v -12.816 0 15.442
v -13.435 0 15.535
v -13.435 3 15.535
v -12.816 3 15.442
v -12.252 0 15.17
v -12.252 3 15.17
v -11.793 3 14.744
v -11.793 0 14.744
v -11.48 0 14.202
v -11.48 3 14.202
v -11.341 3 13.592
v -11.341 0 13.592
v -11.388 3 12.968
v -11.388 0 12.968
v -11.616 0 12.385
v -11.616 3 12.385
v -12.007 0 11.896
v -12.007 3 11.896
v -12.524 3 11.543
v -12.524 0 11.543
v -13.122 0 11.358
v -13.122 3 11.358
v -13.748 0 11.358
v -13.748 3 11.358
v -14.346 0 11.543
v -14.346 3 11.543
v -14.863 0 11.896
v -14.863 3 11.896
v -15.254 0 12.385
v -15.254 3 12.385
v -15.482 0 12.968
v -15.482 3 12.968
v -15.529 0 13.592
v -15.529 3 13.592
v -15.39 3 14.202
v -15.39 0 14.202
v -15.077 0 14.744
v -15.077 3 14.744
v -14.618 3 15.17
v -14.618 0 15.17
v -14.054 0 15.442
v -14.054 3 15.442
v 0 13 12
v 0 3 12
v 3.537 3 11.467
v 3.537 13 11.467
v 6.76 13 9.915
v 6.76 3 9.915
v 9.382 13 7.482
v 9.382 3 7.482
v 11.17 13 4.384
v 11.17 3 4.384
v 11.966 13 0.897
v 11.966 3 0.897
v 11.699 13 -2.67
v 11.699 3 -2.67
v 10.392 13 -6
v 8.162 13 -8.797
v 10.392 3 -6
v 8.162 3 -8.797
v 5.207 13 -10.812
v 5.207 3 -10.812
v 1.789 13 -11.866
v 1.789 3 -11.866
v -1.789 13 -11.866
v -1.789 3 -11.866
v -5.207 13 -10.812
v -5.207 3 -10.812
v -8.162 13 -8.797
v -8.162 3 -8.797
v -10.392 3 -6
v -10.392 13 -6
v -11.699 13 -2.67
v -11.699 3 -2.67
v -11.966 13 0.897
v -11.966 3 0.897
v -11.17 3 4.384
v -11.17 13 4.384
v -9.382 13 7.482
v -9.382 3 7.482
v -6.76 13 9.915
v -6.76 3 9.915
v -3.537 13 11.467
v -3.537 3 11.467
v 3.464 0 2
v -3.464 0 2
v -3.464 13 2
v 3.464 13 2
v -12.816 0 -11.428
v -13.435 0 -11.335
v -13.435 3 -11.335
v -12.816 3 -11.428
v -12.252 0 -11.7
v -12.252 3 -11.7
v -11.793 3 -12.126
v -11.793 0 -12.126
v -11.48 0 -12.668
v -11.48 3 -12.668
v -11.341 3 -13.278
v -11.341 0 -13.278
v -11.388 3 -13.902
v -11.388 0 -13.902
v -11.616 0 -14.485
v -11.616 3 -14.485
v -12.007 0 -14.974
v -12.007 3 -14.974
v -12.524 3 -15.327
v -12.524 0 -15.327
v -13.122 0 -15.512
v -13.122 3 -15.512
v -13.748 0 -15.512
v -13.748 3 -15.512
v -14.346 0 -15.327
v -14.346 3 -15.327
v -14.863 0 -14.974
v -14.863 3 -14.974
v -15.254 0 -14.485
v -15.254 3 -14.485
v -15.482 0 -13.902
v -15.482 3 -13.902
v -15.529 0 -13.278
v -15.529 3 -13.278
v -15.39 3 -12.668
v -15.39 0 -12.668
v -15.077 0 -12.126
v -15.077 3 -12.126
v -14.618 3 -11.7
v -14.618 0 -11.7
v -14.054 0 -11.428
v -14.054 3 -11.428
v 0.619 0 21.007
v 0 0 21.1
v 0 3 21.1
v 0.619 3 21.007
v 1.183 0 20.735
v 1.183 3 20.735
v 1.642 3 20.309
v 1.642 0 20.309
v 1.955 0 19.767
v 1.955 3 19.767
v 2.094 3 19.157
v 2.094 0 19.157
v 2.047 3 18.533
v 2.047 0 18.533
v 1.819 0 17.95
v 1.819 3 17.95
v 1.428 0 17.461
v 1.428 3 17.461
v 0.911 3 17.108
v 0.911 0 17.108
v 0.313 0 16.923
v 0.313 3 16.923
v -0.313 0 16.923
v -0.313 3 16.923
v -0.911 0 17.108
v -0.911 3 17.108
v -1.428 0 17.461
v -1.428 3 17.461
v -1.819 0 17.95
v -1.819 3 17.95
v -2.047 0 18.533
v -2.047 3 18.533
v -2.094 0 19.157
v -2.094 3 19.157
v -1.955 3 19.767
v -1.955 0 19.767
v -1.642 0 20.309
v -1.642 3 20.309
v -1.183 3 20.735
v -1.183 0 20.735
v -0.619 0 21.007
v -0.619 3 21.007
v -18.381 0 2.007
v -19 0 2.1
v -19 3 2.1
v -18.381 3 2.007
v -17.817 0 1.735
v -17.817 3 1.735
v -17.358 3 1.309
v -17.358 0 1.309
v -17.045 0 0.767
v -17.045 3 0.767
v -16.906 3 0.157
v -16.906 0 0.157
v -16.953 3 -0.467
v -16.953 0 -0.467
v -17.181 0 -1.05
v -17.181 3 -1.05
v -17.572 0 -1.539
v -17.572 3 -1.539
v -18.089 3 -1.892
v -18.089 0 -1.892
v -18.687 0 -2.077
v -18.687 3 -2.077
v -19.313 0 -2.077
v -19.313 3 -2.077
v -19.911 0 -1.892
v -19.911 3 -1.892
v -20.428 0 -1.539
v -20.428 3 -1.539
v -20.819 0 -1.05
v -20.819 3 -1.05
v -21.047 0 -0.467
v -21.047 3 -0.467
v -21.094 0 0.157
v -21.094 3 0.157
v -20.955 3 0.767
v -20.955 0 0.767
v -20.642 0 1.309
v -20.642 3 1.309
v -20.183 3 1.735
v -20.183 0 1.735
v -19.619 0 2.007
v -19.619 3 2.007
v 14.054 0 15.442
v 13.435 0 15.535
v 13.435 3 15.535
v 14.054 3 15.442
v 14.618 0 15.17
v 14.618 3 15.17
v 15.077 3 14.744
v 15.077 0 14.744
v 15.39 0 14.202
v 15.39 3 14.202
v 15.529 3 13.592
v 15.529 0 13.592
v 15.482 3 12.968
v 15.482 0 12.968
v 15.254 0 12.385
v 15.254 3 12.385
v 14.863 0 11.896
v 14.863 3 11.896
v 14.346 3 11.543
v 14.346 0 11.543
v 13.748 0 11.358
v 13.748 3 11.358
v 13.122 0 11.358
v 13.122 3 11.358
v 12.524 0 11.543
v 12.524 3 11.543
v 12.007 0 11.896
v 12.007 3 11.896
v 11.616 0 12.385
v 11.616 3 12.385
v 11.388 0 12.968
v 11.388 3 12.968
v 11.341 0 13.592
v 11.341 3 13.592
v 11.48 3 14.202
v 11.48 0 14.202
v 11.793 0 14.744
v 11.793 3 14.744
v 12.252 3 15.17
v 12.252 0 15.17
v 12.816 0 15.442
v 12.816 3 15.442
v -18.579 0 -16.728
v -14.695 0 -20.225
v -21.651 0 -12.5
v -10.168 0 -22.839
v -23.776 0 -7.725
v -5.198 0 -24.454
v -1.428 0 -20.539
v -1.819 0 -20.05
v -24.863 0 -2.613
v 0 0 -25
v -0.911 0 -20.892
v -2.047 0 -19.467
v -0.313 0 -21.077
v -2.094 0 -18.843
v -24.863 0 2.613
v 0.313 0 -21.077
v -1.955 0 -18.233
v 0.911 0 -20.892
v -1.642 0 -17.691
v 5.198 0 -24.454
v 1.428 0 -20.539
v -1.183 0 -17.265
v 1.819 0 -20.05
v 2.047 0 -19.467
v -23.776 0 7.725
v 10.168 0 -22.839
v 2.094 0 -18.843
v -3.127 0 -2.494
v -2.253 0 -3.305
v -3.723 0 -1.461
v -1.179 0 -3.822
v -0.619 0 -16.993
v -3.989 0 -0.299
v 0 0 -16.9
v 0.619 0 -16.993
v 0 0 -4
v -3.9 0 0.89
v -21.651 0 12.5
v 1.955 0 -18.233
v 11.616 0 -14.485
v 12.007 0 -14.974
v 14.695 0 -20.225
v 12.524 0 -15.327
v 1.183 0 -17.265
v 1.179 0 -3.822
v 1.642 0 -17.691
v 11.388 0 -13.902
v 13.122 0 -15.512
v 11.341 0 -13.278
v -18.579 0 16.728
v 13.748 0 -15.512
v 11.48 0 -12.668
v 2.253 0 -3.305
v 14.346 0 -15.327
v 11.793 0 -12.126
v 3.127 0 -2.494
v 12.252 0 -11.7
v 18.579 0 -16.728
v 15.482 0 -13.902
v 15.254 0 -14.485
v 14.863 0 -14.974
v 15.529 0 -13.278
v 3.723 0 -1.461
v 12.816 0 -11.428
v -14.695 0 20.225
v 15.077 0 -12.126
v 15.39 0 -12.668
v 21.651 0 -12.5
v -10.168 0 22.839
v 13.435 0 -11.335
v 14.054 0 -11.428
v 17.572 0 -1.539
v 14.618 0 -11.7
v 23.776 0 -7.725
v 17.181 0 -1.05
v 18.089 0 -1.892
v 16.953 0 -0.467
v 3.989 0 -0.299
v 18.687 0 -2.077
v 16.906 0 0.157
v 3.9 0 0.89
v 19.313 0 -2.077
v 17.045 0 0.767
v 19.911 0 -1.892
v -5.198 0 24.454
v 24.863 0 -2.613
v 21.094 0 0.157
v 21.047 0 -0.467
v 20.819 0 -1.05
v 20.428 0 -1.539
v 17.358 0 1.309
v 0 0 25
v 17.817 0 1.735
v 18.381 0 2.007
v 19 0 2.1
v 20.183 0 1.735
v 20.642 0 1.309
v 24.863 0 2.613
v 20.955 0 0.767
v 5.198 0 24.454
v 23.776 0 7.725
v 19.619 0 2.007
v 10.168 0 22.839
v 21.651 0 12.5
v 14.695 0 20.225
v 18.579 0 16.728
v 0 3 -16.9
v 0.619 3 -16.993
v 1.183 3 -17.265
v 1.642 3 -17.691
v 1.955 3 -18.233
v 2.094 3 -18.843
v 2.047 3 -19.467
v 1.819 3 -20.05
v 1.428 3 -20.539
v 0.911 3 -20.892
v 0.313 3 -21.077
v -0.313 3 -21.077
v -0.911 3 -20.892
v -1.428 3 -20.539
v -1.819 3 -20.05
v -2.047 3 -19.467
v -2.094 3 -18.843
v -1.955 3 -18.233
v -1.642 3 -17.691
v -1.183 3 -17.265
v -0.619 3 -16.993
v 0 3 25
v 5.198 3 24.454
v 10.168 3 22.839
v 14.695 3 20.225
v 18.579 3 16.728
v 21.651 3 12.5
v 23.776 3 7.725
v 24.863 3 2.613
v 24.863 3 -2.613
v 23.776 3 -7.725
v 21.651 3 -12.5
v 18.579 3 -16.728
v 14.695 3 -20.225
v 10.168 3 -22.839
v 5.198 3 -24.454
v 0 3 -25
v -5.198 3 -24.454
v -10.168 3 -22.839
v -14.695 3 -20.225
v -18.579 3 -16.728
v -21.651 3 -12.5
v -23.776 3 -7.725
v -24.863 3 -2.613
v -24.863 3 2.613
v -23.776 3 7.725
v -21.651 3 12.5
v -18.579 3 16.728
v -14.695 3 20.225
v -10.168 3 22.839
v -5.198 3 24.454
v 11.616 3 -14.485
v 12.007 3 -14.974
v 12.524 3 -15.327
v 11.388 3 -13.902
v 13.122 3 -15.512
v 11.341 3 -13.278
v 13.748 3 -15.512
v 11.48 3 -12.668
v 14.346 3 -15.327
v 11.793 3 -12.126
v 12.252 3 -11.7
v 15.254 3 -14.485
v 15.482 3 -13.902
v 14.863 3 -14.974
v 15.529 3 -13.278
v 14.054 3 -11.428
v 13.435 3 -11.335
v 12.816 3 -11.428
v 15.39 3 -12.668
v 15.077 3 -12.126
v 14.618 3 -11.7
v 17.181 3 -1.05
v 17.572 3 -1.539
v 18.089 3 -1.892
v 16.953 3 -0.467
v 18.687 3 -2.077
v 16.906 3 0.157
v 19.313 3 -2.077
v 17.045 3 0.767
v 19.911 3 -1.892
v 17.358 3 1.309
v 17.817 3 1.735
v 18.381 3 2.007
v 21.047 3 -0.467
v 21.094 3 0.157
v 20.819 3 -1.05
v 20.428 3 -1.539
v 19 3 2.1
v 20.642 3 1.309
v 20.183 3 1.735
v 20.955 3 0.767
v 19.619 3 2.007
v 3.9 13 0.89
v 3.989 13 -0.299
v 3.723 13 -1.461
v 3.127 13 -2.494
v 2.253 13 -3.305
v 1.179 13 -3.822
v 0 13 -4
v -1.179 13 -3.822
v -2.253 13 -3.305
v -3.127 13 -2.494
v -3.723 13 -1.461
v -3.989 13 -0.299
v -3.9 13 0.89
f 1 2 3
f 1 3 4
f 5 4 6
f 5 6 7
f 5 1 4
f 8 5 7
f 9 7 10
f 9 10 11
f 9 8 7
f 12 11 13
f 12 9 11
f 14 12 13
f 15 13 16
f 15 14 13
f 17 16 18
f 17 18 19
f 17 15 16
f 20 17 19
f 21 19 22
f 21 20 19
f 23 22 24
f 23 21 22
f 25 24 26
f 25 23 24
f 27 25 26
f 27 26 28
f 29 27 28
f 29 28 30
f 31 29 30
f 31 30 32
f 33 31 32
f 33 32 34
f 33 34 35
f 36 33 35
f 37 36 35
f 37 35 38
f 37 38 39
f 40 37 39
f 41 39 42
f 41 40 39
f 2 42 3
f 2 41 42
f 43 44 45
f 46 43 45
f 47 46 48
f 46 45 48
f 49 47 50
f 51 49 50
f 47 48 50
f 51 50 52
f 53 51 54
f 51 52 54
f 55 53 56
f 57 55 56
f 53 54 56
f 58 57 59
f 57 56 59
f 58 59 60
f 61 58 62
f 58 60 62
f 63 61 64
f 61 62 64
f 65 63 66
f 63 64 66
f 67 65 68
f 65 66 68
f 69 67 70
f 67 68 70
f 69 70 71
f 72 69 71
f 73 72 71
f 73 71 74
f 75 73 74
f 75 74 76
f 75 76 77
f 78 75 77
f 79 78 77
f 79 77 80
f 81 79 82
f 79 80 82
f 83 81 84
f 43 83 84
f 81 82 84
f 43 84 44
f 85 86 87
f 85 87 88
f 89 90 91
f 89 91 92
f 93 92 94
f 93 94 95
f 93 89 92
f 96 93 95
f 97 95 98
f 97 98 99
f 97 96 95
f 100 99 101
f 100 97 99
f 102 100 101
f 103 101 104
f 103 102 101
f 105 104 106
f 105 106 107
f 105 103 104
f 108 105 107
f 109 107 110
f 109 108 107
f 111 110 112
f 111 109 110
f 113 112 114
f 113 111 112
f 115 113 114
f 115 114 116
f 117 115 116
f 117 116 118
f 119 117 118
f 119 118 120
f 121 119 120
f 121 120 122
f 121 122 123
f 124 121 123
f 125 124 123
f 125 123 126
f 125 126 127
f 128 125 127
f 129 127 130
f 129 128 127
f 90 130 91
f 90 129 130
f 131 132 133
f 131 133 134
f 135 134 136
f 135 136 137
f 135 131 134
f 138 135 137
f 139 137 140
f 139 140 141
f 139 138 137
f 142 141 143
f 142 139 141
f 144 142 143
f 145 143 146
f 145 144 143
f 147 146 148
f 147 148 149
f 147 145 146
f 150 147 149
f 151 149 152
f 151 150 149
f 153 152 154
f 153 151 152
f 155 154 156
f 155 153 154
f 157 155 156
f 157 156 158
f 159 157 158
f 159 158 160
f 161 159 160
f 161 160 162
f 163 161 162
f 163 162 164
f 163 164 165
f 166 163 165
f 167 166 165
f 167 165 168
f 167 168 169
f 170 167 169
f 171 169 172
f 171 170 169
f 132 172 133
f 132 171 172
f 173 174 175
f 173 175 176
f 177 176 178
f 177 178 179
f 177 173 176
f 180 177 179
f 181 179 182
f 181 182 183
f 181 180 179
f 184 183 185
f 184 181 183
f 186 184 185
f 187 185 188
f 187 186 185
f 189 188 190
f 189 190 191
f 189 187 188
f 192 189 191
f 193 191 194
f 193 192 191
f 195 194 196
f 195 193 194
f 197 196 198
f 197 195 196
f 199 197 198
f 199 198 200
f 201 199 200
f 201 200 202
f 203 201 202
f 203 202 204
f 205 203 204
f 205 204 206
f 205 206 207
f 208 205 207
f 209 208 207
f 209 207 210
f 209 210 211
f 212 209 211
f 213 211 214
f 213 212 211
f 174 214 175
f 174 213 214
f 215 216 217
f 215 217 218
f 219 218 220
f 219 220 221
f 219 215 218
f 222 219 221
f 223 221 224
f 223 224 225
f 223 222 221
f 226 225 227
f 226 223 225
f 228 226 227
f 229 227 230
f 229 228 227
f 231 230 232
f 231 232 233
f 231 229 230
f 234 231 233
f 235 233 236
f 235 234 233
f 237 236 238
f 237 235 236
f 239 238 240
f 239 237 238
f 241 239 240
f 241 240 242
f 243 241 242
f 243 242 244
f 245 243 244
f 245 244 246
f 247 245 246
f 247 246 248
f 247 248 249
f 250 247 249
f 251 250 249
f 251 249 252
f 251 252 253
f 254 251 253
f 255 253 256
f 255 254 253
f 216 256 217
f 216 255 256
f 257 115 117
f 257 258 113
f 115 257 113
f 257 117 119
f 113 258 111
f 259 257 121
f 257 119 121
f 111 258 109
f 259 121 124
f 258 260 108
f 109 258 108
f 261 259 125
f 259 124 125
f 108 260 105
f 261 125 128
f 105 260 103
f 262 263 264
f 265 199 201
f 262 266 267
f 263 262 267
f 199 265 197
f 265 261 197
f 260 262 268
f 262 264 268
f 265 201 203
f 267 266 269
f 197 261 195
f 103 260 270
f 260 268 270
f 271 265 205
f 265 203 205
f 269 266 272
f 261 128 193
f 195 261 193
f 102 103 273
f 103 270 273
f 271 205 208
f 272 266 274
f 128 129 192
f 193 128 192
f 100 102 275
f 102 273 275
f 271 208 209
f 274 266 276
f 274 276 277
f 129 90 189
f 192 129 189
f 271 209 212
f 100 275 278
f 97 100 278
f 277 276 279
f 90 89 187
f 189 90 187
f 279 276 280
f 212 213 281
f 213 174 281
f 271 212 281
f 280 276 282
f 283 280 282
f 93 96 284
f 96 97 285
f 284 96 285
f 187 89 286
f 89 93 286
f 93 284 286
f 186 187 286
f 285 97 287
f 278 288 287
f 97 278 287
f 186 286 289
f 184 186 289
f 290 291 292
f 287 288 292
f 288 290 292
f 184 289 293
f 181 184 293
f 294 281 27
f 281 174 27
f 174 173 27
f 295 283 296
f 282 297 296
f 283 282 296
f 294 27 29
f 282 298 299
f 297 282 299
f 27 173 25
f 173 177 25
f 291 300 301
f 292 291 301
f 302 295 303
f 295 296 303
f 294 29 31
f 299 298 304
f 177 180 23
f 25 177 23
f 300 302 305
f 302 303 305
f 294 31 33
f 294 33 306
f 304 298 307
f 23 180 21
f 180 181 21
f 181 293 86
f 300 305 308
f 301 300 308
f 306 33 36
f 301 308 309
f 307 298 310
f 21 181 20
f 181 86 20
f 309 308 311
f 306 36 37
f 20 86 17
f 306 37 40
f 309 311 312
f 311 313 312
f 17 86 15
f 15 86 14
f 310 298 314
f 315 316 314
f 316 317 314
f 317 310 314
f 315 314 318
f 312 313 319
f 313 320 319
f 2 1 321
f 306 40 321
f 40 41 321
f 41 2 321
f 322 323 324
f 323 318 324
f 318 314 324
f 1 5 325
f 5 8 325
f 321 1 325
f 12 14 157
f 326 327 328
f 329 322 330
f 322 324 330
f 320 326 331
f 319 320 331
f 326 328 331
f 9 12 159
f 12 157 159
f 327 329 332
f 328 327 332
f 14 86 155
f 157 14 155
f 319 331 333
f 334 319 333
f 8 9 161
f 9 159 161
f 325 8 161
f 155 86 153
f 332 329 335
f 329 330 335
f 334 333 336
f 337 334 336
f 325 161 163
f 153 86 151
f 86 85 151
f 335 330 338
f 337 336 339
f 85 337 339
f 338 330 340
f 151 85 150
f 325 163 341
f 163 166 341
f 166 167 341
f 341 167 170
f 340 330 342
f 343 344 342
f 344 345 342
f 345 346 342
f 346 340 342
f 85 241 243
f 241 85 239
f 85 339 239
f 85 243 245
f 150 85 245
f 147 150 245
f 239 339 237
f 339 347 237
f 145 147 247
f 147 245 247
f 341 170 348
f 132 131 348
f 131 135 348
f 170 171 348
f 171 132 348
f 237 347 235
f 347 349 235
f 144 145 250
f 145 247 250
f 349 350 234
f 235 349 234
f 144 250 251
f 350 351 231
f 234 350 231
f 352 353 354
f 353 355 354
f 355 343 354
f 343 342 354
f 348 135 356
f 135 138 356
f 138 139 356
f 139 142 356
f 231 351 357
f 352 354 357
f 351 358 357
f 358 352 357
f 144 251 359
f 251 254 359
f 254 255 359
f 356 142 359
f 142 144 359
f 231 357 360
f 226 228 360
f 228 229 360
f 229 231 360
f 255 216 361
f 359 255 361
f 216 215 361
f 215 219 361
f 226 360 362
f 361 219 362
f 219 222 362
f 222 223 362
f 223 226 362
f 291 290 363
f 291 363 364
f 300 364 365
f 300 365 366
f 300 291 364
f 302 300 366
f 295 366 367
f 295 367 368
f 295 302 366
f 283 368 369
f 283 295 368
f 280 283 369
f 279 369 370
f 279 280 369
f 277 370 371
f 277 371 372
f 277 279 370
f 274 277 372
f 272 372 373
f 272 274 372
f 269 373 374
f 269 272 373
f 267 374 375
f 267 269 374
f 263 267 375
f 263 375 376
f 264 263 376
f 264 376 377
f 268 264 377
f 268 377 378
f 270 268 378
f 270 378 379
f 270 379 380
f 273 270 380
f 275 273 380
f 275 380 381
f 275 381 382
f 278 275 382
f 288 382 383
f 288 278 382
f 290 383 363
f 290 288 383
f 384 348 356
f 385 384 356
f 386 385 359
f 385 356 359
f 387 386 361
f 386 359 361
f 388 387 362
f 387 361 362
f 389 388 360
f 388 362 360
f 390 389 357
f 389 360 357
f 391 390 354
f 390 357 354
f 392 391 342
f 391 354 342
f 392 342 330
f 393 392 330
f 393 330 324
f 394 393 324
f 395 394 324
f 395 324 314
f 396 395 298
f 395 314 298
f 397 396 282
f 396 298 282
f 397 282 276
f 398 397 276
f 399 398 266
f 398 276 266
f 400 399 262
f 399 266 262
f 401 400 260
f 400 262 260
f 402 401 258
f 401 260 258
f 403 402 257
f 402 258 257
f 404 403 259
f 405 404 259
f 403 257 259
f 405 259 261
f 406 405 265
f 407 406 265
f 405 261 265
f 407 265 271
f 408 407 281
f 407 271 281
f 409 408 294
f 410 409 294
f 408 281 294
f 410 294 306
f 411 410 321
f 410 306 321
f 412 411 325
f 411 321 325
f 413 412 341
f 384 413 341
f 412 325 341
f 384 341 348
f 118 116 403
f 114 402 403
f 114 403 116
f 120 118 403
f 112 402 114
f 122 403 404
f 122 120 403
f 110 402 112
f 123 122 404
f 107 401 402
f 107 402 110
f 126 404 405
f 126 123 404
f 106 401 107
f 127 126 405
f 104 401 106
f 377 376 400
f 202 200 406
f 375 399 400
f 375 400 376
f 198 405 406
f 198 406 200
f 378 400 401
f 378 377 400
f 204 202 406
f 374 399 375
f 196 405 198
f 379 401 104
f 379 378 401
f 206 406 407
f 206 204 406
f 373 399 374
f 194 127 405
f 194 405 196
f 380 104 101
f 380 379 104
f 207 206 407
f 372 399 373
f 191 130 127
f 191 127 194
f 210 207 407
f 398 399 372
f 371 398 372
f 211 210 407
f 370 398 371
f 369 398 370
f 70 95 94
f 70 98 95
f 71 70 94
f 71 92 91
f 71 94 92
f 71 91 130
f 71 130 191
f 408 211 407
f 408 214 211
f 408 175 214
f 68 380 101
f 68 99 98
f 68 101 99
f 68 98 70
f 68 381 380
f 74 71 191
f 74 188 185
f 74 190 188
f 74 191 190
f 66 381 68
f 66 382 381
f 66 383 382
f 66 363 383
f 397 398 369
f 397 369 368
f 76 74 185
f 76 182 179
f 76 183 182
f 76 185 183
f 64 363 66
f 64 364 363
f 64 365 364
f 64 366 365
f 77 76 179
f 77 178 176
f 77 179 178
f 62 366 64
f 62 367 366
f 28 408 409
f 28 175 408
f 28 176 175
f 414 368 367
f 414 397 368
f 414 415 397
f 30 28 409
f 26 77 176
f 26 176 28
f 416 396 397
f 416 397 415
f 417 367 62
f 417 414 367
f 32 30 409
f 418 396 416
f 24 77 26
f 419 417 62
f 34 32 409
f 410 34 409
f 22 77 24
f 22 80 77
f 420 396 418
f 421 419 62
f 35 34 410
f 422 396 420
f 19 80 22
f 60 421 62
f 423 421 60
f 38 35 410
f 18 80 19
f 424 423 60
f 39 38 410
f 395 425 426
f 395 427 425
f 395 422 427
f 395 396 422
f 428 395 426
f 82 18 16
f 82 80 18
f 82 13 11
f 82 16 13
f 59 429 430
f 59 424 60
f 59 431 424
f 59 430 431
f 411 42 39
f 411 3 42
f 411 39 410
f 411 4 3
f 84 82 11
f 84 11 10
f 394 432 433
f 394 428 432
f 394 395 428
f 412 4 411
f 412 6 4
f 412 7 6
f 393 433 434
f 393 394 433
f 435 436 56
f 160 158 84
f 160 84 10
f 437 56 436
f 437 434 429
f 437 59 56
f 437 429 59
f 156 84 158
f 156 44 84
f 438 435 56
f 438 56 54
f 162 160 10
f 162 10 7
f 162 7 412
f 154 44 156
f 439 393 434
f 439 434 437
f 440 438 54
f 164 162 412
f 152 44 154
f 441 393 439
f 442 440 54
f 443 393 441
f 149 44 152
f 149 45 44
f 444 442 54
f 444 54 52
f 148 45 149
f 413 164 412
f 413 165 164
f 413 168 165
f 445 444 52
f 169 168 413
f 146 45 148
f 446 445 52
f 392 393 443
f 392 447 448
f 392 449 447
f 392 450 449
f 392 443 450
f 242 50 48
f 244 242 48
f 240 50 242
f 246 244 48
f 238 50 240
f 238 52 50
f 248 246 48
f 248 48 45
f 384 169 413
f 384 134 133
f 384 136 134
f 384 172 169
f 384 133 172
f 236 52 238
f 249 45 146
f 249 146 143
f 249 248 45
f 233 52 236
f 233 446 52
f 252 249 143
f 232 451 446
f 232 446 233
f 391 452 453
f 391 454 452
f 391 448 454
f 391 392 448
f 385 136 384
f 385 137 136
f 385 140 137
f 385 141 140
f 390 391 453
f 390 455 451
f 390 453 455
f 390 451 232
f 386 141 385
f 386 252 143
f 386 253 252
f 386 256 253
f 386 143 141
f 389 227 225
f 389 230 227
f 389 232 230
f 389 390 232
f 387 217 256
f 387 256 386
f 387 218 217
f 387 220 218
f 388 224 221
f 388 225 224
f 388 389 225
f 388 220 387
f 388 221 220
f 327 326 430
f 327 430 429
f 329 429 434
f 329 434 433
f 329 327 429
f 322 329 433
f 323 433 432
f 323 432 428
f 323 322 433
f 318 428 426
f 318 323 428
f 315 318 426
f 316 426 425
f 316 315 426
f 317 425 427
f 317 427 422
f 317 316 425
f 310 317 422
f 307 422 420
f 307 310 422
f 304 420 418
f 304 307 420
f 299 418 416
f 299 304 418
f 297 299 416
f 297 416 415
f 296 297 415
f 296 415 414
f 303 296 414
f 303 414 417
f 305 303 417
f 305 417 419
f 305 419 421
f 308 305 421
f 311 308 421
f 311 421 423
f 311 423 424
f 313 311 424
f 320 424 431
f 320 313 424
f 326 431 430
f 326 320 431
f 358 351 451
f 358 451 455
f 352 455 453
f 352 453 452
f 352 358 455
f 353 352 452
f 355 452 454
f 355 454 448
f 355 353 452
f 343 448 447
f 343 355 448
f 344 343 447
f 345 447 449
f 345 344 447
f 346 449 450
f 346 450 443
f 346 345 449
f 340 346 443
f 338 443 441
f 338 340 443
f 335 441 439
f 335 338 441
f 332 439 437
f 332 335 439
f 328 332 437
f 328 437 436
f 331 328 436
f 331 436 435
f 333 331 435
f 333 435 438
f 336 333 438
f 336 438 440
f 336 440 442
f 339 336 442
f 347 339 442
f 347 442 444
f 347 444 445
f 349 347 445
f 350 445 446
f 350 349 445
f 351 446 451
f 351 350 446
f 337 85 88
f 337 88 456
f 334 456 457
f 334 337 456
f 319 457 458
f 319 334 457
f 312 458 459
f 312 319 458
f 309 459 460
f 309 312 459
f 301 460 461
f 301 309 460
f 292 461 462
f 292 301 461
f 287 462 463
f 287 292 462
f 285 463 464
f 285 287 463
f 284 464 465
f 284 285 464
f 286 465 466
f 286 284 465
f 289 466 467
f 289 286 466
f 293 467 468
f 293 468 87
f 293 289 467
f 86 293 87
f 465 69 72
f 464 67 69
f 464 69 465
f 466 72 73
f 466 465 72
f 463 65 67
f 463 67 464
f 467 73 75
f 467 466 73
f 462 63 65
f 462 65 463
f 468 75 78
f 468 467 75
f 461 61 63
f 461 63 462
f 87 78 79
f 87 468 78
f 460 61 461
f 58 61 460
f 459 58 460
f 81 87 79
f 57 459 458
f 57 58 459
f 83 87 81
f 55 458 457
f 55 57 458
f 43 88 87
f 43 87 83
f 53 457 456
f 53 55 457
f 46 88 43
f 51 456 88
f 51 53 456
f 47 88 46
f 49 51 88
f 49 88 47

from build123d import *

# Parameters (mm, degrees)
SKETCH_1_R          = 25
SKETCH_1_R_2        = 2.1
EXTRUDE_1_DEPTH     = 3
SKETCH_2_R          = 12
EXTRUDE_2_DEPTH     = 10
CUT_EXTRUDE_START   = -20
CUT_EXTRUDE_1_DEPTH = 20


with BuildPart() as part:
    # 草图1 → 凸台-拉伸1 (new body)
    with BuildSketch(Plane(origin=(0, 0, 0), x_dir=(1, 0, 0), z_dir=(0, 1, 0))):
        with Locations(Location((0, 0, 0), (0, 0, 270))):
            Circle(SKETCH_1_R)
        with Locations(Location((0, 19, 0), (0, 0, 270))):
            Circle(SKETCH_1_R_2, mode=Mode.SUBTRACT)
        with Locations(Location((13.435028843, 13.435028843, 0), (0, 0, 270))):
            Circle(SKETCH_1_R_2, mode=Mode.SUBTRACT)
        with Locations(Location((19, 0, 0), (0, 0, 270))):
            Circle(SKETCH_1_R_2, mode=Mode.SUBTRACT)
        with Locations(Location((13.435028843, -13.435028843, 0), (0, 0, 270))):
            Circle(SKETCH_1_R_2, mode=Mode.SUBTRACT)
        with Locations(Location((0, -19, 0), (0, 0, 270))):
            Circle(SKETCH_1_R_2, mode=Mode.SUBTRACT)
        with Locations(Location((-13.435028843, -13.435028843, 0), (0, 0, 270))):
            Circle(SKETCH_1_R_2, mode=Mode.SUBTRACT)
        with Locations(Location((-19, 0, 0), (0, 0, 270))):
            Circle(SKETCH_1_R_2, mode=Mode.SUBTRACT)
        with Locations(Location((-13.435028843, 13.435028843, 0), (0, 0, 270))):
            Circle(SKETCH_1_R_2, mode=Mode.SUBTRACT)
    extrude(amount=EXTRUDE_1_DEPTH)

    # 草图2 → 凸台-拉伸2 (add)
    with BuildSketch(Plane(origin=(0, 3, 0), x_dir=(1, 0, 0), z_dir=(0, 1, 0))):
        with Locations(Location((0, 0, 0), (0, 0, 270))):
            Circle(SKETCH_2_R)
        with BuildLine():
            Line((-3.464101615, -2), (3.464101615, -2))
            ThreePointArc((3.464101615, -2), (0, 4), (-3.464101615, -2))
        make_face(mode=Mode.SUBTRACT)
    extrude(amount=EXTRUDE_2_DEPTH)

    # 草图3 → 切除-拉伸1 (cut)
    with BuildSketch(Plane(origin=(0, 13, 0), x_dir=(1, 0, 0), z_dir=(0, 1, 0)).offset(CUT_EXTRUDE_START)):
        with BuildLine():
            Line((-3.464101615, -2), (3.464101615, -2))
            ThreePointArc((3.464101615, -2), (0, 4), (-3.464101615, -2))
        make_face()
    extrude(amount=CUT_EXTRUDE_1_DEPTH, mode=Mode.SUBTRACT)


solid = part.part
